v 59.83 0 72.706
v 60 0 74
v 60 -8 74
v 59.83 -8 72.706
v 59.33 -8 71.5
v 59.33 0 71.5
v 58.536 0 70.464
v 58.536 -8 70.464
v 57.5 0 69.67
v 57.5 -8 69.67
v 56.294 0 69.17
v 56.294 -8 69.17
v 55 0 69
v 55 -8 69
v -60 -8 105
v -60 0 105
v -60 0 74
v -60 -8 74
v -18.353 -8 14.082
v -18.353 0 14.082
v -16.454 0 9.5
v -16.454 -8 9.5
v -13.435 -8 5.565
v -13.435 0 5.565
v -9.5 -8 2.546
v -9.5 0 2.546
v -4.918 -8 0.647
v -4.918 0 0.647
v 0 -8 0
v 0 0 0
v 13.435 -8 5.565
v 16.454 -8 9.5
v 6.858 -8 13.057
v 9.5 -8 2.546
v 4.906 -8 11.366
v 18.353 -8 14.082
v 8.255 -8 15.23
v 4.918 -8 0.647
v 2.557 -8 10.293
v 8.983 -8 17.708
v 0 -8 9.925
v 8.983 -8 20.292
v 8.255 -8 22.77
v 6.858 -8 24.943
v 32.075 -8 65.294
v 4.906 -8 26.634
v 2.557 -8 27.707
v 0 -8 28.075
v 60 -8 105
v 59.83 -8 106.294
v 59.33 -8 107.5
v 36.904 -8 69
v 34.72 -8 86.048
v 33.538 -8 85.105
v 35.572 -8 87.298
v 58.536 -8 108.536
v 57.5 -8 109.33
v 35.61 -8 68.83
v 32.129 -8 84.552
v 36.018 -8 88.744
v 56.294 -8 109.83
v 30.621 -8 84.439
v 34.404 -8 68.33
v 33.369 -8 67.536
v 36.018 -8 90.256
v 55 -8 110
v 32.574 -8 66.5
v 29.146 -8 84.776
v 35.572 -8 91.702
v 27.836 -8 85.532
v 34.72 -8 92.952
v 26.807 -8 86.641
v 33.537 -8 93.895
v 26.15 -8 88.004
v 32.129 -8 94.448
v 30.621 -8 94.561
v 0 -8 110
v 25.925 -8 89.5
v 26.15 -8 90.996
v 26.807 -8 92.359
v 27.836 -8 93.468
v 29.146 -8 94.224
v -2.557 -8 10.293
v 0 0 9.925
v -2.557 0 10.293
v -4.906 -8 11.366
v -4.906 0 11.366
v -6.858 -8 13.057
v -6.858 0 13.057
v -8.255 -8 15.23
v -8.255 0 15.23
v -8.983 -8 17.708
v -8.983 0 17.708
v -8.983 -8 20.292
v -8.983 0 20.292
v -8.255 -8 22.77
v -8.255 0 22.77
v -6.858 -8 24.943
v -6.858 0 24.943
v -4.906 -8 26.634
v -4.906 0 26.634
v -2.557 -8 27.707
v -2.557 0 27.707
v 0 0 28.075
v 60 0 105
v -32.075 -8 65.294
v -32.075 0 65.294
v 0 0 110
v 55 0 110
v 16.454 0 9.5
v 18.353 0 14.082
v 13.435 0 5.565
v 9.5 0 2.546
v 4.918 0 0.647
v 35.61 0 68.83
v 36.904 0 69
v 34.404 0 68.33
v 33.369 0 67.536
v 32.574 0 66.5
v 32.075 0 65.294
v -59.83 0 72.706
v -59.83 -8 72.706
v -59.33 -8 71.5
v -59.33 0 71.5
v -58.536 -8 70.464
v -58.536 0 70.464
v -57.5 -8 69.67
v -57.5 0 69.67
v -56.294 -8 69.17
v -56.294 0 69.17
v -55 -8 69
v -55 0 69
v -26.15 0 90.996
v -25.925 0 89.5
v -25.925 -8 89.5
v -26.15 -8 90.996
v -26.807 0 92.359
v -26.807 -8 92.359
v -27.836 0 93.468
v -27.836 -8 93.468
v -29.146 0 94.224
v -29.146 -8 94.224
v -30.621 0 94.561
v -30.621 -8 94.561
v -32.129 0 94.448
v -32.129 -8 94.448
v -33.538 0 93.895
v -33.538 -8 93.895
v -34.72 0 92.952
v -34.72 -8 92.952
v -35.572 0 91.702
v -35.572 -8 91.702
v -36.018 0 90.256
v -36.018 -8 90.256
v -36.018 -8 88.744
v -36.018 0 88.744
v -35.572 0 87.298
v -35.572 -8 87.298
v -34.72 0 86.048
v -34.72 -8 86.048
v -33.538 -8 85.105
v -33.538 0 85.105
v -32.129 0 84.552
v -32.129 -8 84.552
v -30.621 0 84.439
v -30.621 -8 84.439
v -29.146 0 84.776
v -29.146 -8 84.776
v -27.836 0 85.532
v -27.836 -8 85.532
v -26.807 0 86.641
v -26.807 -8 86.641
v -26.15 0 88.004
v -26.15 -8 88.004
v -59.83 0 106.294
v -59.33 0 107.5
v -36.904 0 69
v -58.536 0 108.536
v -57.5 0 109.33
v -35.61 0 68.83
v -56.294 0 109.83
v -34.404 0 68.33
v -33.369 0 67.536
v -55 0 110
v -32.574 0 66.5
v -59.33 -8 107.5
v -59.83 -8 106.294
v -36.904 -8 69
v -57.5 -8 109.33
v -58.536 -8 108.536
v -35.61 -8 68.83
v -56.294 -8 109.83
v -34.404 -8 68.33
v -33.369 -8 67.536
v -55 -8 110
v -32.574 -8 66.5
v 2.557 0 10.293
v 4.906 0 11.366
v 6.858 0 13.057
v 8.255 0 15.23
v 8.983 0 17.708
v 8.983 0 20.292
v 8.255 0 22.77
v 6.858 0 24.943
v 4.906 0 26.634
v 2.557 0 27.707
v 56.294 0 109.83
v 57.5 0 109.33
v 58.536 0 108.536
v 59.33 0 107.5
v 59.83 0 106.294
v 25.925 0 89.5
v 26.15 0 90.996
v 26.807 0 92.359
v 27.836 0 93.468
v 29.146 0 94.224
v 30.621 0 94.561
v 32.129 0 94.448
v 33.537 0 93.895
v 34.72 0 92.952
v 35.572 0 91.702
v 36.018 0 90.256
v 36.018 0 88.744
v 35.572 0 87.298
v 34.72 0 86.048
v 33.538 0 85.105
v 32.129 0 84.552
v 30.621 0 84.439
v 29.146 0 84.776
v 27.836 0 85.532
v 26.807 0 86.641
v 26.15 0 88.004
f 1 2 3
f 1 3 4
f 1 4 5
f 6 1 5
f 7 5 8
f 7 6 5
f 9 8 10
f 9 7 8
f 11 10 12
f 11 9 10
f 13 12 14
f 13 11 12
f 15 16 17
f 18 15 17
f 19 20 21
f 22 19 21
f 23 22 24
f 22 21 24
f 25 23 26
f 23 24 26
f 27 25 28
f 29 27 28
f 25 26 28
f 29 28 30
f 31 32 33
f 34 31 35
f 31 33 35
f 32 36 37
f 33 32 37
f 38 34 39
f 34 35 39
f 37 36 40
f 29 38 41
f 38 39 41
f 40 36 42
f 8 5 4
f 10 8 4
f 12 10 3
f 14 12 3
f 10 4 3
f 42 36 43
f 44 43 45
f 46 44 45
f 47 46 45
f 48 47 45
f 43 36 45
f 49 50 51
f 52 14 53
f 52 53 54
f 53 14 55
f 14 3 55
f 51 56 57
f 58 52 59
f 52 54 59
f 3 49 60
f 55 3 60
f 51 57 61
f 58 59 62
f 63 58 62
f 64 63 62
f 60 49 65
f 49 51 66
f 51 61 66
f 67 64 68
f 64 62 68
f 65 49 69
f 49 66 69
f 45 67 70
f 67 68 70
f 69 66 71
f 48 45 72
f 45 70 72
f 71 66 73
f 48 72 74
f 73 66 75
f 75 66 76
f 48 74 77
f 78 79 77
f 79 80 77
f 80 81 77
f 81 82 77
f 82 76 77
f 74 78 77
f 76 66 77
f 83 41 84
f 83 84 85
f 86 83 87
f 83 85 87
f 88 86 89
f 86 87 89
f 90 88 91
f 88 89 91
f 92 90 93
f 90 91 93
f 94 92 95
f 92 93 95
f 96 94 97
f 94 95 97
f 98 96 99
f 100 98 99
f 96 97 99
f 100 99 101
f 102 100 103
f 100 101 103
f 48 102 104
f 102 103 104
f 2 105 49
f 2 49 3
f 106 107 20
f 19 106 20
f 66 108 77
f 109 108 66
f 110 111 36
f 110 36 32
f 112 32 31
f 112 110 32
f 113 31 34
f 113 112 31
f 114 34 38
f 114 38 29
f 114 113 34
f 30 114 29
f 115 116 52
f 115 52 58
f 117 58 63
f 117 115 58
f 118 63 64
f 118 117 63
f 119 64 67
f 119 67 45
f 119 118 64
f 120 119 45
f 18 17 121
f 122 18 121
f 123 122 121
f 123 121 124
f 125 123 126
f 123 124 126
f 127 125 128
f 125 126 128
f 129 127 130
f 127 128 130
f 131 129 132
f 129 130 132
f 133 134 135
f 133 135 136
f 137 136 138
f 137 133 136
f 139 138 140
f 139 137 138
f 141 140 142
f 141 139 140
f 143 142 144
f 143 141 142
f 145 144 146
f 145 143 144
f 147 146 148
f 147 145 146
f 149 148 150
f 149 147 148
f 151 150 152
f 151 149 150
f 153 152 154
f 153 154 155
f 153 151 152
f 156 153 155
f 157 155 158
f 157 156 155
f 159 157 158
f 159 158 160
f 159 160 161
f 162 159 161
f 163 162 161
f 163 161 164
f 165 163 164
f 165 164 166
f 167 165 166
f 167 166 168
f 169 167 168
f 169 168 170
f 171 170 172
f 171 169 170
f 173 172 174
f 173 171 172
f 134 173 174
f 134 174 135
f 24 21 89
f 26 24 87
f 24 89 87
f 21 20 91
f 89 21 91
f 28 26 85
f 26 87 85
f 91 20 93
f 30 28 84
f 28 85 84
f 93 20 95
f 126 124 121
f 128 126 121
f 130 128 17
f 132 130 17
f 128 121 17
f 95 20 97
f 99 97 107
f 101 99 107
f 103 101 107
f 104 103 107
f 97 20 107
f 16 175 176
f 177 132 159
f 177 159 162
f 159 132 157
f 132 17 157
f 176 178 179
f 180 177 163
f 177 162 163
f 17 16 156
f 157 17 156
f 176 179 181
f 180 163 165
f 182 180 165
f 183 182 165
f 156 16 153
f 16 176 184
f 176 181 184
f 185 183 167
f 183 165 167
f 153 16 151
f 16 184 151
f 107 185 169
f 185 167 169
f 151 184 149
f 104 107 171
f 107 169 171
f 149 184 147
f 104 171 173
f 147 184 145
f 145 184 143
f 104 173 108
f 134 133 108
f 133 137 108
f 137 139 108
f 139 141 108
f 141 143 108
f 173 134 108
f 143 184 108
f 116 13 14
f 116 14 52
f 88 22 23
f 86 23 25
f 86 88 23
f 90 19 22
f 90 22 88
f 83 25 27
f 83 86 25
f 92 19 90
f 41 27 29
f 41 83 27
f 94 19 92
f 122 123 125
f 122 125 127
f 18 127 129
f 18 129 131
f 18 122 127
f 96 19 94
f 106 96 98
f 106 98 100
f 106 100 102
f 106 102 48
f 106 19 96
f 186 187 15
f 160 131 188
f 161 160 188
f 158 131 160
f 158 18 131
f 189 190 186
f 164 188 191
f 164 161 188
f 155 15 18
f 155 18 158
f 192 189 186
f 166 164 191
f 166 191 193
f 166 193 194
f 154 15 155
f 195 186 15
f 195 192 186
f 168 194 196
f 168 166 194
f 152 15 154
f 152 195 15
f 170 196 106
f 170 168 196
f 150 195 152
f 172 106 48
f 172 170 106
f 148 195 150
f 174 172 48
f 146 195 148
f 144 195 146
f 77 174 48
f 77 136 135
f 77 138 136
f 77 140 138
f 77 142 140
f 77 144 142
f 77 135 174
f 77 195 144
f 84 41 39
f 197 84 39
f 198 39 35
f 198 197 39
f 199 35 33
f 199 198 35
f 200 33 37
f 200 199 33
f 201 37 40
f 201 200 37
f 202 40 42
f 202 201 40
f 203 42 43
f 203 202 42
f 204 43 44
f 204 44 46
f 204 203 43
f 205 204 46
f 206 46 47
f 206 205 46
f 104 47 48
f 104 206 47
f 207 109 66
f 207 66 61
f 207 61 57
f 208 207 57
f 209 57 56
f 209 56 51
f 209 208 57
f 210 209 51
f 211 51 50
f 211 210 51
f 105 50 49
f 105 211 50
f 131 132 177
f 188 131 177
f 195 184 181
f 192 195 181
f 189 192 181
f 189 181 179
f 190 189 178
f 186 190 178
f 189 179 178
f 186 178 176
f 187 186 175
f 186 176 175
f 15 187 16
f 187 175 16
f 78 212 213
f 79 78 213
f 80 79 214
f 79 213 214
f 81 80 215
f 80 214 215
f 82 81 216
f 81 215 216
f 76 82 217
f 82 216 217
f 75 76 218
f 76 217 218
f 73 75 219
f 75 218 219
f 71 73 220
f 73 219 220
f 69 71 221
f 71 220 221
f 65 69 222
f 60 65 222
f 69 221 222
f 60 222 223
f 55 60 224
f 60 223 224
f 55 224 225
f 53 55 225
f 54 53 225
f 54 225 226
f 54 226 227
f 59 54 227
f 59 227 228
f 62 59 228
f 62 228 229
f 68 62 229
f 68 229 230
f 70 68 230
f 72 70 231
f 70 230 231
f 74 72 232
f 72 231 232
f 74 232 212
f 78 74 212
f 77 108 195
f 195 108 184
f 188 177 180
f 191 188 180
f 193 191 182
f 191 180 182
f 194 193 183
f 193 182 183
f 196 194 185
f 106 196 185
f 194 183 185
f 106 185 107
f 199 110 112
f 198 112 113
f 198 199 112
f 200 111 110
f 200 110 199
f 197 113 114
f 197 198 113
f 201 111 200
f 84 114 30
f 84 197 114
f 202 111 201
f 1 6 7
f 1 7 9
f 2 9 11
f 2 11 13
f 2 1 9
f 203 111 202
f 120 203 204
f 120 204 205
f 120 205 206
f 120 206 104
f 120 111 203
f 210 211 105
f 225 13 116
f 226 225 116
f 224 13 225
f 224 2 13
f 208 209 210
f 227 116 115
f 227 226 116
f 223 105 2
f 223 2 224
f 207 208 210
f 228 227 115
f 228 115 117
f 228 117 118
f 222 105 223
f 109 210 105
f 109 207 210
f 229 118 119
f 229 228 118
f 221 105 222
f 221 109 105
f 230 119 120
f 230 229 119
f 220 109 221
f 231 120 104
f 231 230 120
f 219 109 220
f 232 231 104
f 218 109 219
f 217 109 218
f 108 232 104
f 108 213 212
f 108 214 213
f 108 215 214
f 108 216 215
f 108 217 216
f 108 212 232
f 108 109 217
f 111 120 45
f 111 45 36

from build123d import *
from build123d import SkipClean  # not in build123d's __all__

# Parameters (mm, degrees)
F0_R     = 5.075
F1_DEPTH = 8


with BuildPart() as f1:
    # F0 (on Front) → F1 (new body)
    with BuildSketch(Plane.XZ):
        with BuildLine():
            ThreePointArc((-18.3525906995, 14.0824381431), (-11.5664671512, 3.9262865345), (0, 0))
            Line((0, 0), (0, 9.925))
            ThreePointArc((0, 9.925), (-9.075, 19), (0, 28.075))
            Line((0, 28.075), (0, 110))
            Line((0, 110), (-55, 110))
            ThreePointArc((-55, 110), (-58.5355339059, 108.5355339059), (-60, 105))
            Line((-60, 105), (-60, 74))
            ThreePointArc((-60, 74), (-58.5355339059, 70.4644660941), (-55, 69))
            Line((-55, 69), (-36.9043419892, 69))
            ThreePointArc((-36.9043419892, 69), (-33.8605348442, 67.9667667015), (-32.0747128578, 65.2940952255))
            Line((-32.0747128578, 65.2940952255), (-18.3525906995, 14.0824381431))
        make_face()
        with Locations((-31, 89.5)):
            Circle(F0_R, mode=Mode.SUBTRACT)
    extrude(amount=F1_DEPTH)

    # F2: F1 across face


with BuildPart() as f1_1:
    add(f1.part, clean=False)
    with SkipClean():  # cleaning this boolean's faces spoils the solid; the shape is the same uncleaned
        add(f1.part.mirror(Plane(origin=(0, -4, 69.0375), x_dir=(0, 1, 0), z_dir=(1, 0, 0))), clean=False)


solid = f1_1.part
